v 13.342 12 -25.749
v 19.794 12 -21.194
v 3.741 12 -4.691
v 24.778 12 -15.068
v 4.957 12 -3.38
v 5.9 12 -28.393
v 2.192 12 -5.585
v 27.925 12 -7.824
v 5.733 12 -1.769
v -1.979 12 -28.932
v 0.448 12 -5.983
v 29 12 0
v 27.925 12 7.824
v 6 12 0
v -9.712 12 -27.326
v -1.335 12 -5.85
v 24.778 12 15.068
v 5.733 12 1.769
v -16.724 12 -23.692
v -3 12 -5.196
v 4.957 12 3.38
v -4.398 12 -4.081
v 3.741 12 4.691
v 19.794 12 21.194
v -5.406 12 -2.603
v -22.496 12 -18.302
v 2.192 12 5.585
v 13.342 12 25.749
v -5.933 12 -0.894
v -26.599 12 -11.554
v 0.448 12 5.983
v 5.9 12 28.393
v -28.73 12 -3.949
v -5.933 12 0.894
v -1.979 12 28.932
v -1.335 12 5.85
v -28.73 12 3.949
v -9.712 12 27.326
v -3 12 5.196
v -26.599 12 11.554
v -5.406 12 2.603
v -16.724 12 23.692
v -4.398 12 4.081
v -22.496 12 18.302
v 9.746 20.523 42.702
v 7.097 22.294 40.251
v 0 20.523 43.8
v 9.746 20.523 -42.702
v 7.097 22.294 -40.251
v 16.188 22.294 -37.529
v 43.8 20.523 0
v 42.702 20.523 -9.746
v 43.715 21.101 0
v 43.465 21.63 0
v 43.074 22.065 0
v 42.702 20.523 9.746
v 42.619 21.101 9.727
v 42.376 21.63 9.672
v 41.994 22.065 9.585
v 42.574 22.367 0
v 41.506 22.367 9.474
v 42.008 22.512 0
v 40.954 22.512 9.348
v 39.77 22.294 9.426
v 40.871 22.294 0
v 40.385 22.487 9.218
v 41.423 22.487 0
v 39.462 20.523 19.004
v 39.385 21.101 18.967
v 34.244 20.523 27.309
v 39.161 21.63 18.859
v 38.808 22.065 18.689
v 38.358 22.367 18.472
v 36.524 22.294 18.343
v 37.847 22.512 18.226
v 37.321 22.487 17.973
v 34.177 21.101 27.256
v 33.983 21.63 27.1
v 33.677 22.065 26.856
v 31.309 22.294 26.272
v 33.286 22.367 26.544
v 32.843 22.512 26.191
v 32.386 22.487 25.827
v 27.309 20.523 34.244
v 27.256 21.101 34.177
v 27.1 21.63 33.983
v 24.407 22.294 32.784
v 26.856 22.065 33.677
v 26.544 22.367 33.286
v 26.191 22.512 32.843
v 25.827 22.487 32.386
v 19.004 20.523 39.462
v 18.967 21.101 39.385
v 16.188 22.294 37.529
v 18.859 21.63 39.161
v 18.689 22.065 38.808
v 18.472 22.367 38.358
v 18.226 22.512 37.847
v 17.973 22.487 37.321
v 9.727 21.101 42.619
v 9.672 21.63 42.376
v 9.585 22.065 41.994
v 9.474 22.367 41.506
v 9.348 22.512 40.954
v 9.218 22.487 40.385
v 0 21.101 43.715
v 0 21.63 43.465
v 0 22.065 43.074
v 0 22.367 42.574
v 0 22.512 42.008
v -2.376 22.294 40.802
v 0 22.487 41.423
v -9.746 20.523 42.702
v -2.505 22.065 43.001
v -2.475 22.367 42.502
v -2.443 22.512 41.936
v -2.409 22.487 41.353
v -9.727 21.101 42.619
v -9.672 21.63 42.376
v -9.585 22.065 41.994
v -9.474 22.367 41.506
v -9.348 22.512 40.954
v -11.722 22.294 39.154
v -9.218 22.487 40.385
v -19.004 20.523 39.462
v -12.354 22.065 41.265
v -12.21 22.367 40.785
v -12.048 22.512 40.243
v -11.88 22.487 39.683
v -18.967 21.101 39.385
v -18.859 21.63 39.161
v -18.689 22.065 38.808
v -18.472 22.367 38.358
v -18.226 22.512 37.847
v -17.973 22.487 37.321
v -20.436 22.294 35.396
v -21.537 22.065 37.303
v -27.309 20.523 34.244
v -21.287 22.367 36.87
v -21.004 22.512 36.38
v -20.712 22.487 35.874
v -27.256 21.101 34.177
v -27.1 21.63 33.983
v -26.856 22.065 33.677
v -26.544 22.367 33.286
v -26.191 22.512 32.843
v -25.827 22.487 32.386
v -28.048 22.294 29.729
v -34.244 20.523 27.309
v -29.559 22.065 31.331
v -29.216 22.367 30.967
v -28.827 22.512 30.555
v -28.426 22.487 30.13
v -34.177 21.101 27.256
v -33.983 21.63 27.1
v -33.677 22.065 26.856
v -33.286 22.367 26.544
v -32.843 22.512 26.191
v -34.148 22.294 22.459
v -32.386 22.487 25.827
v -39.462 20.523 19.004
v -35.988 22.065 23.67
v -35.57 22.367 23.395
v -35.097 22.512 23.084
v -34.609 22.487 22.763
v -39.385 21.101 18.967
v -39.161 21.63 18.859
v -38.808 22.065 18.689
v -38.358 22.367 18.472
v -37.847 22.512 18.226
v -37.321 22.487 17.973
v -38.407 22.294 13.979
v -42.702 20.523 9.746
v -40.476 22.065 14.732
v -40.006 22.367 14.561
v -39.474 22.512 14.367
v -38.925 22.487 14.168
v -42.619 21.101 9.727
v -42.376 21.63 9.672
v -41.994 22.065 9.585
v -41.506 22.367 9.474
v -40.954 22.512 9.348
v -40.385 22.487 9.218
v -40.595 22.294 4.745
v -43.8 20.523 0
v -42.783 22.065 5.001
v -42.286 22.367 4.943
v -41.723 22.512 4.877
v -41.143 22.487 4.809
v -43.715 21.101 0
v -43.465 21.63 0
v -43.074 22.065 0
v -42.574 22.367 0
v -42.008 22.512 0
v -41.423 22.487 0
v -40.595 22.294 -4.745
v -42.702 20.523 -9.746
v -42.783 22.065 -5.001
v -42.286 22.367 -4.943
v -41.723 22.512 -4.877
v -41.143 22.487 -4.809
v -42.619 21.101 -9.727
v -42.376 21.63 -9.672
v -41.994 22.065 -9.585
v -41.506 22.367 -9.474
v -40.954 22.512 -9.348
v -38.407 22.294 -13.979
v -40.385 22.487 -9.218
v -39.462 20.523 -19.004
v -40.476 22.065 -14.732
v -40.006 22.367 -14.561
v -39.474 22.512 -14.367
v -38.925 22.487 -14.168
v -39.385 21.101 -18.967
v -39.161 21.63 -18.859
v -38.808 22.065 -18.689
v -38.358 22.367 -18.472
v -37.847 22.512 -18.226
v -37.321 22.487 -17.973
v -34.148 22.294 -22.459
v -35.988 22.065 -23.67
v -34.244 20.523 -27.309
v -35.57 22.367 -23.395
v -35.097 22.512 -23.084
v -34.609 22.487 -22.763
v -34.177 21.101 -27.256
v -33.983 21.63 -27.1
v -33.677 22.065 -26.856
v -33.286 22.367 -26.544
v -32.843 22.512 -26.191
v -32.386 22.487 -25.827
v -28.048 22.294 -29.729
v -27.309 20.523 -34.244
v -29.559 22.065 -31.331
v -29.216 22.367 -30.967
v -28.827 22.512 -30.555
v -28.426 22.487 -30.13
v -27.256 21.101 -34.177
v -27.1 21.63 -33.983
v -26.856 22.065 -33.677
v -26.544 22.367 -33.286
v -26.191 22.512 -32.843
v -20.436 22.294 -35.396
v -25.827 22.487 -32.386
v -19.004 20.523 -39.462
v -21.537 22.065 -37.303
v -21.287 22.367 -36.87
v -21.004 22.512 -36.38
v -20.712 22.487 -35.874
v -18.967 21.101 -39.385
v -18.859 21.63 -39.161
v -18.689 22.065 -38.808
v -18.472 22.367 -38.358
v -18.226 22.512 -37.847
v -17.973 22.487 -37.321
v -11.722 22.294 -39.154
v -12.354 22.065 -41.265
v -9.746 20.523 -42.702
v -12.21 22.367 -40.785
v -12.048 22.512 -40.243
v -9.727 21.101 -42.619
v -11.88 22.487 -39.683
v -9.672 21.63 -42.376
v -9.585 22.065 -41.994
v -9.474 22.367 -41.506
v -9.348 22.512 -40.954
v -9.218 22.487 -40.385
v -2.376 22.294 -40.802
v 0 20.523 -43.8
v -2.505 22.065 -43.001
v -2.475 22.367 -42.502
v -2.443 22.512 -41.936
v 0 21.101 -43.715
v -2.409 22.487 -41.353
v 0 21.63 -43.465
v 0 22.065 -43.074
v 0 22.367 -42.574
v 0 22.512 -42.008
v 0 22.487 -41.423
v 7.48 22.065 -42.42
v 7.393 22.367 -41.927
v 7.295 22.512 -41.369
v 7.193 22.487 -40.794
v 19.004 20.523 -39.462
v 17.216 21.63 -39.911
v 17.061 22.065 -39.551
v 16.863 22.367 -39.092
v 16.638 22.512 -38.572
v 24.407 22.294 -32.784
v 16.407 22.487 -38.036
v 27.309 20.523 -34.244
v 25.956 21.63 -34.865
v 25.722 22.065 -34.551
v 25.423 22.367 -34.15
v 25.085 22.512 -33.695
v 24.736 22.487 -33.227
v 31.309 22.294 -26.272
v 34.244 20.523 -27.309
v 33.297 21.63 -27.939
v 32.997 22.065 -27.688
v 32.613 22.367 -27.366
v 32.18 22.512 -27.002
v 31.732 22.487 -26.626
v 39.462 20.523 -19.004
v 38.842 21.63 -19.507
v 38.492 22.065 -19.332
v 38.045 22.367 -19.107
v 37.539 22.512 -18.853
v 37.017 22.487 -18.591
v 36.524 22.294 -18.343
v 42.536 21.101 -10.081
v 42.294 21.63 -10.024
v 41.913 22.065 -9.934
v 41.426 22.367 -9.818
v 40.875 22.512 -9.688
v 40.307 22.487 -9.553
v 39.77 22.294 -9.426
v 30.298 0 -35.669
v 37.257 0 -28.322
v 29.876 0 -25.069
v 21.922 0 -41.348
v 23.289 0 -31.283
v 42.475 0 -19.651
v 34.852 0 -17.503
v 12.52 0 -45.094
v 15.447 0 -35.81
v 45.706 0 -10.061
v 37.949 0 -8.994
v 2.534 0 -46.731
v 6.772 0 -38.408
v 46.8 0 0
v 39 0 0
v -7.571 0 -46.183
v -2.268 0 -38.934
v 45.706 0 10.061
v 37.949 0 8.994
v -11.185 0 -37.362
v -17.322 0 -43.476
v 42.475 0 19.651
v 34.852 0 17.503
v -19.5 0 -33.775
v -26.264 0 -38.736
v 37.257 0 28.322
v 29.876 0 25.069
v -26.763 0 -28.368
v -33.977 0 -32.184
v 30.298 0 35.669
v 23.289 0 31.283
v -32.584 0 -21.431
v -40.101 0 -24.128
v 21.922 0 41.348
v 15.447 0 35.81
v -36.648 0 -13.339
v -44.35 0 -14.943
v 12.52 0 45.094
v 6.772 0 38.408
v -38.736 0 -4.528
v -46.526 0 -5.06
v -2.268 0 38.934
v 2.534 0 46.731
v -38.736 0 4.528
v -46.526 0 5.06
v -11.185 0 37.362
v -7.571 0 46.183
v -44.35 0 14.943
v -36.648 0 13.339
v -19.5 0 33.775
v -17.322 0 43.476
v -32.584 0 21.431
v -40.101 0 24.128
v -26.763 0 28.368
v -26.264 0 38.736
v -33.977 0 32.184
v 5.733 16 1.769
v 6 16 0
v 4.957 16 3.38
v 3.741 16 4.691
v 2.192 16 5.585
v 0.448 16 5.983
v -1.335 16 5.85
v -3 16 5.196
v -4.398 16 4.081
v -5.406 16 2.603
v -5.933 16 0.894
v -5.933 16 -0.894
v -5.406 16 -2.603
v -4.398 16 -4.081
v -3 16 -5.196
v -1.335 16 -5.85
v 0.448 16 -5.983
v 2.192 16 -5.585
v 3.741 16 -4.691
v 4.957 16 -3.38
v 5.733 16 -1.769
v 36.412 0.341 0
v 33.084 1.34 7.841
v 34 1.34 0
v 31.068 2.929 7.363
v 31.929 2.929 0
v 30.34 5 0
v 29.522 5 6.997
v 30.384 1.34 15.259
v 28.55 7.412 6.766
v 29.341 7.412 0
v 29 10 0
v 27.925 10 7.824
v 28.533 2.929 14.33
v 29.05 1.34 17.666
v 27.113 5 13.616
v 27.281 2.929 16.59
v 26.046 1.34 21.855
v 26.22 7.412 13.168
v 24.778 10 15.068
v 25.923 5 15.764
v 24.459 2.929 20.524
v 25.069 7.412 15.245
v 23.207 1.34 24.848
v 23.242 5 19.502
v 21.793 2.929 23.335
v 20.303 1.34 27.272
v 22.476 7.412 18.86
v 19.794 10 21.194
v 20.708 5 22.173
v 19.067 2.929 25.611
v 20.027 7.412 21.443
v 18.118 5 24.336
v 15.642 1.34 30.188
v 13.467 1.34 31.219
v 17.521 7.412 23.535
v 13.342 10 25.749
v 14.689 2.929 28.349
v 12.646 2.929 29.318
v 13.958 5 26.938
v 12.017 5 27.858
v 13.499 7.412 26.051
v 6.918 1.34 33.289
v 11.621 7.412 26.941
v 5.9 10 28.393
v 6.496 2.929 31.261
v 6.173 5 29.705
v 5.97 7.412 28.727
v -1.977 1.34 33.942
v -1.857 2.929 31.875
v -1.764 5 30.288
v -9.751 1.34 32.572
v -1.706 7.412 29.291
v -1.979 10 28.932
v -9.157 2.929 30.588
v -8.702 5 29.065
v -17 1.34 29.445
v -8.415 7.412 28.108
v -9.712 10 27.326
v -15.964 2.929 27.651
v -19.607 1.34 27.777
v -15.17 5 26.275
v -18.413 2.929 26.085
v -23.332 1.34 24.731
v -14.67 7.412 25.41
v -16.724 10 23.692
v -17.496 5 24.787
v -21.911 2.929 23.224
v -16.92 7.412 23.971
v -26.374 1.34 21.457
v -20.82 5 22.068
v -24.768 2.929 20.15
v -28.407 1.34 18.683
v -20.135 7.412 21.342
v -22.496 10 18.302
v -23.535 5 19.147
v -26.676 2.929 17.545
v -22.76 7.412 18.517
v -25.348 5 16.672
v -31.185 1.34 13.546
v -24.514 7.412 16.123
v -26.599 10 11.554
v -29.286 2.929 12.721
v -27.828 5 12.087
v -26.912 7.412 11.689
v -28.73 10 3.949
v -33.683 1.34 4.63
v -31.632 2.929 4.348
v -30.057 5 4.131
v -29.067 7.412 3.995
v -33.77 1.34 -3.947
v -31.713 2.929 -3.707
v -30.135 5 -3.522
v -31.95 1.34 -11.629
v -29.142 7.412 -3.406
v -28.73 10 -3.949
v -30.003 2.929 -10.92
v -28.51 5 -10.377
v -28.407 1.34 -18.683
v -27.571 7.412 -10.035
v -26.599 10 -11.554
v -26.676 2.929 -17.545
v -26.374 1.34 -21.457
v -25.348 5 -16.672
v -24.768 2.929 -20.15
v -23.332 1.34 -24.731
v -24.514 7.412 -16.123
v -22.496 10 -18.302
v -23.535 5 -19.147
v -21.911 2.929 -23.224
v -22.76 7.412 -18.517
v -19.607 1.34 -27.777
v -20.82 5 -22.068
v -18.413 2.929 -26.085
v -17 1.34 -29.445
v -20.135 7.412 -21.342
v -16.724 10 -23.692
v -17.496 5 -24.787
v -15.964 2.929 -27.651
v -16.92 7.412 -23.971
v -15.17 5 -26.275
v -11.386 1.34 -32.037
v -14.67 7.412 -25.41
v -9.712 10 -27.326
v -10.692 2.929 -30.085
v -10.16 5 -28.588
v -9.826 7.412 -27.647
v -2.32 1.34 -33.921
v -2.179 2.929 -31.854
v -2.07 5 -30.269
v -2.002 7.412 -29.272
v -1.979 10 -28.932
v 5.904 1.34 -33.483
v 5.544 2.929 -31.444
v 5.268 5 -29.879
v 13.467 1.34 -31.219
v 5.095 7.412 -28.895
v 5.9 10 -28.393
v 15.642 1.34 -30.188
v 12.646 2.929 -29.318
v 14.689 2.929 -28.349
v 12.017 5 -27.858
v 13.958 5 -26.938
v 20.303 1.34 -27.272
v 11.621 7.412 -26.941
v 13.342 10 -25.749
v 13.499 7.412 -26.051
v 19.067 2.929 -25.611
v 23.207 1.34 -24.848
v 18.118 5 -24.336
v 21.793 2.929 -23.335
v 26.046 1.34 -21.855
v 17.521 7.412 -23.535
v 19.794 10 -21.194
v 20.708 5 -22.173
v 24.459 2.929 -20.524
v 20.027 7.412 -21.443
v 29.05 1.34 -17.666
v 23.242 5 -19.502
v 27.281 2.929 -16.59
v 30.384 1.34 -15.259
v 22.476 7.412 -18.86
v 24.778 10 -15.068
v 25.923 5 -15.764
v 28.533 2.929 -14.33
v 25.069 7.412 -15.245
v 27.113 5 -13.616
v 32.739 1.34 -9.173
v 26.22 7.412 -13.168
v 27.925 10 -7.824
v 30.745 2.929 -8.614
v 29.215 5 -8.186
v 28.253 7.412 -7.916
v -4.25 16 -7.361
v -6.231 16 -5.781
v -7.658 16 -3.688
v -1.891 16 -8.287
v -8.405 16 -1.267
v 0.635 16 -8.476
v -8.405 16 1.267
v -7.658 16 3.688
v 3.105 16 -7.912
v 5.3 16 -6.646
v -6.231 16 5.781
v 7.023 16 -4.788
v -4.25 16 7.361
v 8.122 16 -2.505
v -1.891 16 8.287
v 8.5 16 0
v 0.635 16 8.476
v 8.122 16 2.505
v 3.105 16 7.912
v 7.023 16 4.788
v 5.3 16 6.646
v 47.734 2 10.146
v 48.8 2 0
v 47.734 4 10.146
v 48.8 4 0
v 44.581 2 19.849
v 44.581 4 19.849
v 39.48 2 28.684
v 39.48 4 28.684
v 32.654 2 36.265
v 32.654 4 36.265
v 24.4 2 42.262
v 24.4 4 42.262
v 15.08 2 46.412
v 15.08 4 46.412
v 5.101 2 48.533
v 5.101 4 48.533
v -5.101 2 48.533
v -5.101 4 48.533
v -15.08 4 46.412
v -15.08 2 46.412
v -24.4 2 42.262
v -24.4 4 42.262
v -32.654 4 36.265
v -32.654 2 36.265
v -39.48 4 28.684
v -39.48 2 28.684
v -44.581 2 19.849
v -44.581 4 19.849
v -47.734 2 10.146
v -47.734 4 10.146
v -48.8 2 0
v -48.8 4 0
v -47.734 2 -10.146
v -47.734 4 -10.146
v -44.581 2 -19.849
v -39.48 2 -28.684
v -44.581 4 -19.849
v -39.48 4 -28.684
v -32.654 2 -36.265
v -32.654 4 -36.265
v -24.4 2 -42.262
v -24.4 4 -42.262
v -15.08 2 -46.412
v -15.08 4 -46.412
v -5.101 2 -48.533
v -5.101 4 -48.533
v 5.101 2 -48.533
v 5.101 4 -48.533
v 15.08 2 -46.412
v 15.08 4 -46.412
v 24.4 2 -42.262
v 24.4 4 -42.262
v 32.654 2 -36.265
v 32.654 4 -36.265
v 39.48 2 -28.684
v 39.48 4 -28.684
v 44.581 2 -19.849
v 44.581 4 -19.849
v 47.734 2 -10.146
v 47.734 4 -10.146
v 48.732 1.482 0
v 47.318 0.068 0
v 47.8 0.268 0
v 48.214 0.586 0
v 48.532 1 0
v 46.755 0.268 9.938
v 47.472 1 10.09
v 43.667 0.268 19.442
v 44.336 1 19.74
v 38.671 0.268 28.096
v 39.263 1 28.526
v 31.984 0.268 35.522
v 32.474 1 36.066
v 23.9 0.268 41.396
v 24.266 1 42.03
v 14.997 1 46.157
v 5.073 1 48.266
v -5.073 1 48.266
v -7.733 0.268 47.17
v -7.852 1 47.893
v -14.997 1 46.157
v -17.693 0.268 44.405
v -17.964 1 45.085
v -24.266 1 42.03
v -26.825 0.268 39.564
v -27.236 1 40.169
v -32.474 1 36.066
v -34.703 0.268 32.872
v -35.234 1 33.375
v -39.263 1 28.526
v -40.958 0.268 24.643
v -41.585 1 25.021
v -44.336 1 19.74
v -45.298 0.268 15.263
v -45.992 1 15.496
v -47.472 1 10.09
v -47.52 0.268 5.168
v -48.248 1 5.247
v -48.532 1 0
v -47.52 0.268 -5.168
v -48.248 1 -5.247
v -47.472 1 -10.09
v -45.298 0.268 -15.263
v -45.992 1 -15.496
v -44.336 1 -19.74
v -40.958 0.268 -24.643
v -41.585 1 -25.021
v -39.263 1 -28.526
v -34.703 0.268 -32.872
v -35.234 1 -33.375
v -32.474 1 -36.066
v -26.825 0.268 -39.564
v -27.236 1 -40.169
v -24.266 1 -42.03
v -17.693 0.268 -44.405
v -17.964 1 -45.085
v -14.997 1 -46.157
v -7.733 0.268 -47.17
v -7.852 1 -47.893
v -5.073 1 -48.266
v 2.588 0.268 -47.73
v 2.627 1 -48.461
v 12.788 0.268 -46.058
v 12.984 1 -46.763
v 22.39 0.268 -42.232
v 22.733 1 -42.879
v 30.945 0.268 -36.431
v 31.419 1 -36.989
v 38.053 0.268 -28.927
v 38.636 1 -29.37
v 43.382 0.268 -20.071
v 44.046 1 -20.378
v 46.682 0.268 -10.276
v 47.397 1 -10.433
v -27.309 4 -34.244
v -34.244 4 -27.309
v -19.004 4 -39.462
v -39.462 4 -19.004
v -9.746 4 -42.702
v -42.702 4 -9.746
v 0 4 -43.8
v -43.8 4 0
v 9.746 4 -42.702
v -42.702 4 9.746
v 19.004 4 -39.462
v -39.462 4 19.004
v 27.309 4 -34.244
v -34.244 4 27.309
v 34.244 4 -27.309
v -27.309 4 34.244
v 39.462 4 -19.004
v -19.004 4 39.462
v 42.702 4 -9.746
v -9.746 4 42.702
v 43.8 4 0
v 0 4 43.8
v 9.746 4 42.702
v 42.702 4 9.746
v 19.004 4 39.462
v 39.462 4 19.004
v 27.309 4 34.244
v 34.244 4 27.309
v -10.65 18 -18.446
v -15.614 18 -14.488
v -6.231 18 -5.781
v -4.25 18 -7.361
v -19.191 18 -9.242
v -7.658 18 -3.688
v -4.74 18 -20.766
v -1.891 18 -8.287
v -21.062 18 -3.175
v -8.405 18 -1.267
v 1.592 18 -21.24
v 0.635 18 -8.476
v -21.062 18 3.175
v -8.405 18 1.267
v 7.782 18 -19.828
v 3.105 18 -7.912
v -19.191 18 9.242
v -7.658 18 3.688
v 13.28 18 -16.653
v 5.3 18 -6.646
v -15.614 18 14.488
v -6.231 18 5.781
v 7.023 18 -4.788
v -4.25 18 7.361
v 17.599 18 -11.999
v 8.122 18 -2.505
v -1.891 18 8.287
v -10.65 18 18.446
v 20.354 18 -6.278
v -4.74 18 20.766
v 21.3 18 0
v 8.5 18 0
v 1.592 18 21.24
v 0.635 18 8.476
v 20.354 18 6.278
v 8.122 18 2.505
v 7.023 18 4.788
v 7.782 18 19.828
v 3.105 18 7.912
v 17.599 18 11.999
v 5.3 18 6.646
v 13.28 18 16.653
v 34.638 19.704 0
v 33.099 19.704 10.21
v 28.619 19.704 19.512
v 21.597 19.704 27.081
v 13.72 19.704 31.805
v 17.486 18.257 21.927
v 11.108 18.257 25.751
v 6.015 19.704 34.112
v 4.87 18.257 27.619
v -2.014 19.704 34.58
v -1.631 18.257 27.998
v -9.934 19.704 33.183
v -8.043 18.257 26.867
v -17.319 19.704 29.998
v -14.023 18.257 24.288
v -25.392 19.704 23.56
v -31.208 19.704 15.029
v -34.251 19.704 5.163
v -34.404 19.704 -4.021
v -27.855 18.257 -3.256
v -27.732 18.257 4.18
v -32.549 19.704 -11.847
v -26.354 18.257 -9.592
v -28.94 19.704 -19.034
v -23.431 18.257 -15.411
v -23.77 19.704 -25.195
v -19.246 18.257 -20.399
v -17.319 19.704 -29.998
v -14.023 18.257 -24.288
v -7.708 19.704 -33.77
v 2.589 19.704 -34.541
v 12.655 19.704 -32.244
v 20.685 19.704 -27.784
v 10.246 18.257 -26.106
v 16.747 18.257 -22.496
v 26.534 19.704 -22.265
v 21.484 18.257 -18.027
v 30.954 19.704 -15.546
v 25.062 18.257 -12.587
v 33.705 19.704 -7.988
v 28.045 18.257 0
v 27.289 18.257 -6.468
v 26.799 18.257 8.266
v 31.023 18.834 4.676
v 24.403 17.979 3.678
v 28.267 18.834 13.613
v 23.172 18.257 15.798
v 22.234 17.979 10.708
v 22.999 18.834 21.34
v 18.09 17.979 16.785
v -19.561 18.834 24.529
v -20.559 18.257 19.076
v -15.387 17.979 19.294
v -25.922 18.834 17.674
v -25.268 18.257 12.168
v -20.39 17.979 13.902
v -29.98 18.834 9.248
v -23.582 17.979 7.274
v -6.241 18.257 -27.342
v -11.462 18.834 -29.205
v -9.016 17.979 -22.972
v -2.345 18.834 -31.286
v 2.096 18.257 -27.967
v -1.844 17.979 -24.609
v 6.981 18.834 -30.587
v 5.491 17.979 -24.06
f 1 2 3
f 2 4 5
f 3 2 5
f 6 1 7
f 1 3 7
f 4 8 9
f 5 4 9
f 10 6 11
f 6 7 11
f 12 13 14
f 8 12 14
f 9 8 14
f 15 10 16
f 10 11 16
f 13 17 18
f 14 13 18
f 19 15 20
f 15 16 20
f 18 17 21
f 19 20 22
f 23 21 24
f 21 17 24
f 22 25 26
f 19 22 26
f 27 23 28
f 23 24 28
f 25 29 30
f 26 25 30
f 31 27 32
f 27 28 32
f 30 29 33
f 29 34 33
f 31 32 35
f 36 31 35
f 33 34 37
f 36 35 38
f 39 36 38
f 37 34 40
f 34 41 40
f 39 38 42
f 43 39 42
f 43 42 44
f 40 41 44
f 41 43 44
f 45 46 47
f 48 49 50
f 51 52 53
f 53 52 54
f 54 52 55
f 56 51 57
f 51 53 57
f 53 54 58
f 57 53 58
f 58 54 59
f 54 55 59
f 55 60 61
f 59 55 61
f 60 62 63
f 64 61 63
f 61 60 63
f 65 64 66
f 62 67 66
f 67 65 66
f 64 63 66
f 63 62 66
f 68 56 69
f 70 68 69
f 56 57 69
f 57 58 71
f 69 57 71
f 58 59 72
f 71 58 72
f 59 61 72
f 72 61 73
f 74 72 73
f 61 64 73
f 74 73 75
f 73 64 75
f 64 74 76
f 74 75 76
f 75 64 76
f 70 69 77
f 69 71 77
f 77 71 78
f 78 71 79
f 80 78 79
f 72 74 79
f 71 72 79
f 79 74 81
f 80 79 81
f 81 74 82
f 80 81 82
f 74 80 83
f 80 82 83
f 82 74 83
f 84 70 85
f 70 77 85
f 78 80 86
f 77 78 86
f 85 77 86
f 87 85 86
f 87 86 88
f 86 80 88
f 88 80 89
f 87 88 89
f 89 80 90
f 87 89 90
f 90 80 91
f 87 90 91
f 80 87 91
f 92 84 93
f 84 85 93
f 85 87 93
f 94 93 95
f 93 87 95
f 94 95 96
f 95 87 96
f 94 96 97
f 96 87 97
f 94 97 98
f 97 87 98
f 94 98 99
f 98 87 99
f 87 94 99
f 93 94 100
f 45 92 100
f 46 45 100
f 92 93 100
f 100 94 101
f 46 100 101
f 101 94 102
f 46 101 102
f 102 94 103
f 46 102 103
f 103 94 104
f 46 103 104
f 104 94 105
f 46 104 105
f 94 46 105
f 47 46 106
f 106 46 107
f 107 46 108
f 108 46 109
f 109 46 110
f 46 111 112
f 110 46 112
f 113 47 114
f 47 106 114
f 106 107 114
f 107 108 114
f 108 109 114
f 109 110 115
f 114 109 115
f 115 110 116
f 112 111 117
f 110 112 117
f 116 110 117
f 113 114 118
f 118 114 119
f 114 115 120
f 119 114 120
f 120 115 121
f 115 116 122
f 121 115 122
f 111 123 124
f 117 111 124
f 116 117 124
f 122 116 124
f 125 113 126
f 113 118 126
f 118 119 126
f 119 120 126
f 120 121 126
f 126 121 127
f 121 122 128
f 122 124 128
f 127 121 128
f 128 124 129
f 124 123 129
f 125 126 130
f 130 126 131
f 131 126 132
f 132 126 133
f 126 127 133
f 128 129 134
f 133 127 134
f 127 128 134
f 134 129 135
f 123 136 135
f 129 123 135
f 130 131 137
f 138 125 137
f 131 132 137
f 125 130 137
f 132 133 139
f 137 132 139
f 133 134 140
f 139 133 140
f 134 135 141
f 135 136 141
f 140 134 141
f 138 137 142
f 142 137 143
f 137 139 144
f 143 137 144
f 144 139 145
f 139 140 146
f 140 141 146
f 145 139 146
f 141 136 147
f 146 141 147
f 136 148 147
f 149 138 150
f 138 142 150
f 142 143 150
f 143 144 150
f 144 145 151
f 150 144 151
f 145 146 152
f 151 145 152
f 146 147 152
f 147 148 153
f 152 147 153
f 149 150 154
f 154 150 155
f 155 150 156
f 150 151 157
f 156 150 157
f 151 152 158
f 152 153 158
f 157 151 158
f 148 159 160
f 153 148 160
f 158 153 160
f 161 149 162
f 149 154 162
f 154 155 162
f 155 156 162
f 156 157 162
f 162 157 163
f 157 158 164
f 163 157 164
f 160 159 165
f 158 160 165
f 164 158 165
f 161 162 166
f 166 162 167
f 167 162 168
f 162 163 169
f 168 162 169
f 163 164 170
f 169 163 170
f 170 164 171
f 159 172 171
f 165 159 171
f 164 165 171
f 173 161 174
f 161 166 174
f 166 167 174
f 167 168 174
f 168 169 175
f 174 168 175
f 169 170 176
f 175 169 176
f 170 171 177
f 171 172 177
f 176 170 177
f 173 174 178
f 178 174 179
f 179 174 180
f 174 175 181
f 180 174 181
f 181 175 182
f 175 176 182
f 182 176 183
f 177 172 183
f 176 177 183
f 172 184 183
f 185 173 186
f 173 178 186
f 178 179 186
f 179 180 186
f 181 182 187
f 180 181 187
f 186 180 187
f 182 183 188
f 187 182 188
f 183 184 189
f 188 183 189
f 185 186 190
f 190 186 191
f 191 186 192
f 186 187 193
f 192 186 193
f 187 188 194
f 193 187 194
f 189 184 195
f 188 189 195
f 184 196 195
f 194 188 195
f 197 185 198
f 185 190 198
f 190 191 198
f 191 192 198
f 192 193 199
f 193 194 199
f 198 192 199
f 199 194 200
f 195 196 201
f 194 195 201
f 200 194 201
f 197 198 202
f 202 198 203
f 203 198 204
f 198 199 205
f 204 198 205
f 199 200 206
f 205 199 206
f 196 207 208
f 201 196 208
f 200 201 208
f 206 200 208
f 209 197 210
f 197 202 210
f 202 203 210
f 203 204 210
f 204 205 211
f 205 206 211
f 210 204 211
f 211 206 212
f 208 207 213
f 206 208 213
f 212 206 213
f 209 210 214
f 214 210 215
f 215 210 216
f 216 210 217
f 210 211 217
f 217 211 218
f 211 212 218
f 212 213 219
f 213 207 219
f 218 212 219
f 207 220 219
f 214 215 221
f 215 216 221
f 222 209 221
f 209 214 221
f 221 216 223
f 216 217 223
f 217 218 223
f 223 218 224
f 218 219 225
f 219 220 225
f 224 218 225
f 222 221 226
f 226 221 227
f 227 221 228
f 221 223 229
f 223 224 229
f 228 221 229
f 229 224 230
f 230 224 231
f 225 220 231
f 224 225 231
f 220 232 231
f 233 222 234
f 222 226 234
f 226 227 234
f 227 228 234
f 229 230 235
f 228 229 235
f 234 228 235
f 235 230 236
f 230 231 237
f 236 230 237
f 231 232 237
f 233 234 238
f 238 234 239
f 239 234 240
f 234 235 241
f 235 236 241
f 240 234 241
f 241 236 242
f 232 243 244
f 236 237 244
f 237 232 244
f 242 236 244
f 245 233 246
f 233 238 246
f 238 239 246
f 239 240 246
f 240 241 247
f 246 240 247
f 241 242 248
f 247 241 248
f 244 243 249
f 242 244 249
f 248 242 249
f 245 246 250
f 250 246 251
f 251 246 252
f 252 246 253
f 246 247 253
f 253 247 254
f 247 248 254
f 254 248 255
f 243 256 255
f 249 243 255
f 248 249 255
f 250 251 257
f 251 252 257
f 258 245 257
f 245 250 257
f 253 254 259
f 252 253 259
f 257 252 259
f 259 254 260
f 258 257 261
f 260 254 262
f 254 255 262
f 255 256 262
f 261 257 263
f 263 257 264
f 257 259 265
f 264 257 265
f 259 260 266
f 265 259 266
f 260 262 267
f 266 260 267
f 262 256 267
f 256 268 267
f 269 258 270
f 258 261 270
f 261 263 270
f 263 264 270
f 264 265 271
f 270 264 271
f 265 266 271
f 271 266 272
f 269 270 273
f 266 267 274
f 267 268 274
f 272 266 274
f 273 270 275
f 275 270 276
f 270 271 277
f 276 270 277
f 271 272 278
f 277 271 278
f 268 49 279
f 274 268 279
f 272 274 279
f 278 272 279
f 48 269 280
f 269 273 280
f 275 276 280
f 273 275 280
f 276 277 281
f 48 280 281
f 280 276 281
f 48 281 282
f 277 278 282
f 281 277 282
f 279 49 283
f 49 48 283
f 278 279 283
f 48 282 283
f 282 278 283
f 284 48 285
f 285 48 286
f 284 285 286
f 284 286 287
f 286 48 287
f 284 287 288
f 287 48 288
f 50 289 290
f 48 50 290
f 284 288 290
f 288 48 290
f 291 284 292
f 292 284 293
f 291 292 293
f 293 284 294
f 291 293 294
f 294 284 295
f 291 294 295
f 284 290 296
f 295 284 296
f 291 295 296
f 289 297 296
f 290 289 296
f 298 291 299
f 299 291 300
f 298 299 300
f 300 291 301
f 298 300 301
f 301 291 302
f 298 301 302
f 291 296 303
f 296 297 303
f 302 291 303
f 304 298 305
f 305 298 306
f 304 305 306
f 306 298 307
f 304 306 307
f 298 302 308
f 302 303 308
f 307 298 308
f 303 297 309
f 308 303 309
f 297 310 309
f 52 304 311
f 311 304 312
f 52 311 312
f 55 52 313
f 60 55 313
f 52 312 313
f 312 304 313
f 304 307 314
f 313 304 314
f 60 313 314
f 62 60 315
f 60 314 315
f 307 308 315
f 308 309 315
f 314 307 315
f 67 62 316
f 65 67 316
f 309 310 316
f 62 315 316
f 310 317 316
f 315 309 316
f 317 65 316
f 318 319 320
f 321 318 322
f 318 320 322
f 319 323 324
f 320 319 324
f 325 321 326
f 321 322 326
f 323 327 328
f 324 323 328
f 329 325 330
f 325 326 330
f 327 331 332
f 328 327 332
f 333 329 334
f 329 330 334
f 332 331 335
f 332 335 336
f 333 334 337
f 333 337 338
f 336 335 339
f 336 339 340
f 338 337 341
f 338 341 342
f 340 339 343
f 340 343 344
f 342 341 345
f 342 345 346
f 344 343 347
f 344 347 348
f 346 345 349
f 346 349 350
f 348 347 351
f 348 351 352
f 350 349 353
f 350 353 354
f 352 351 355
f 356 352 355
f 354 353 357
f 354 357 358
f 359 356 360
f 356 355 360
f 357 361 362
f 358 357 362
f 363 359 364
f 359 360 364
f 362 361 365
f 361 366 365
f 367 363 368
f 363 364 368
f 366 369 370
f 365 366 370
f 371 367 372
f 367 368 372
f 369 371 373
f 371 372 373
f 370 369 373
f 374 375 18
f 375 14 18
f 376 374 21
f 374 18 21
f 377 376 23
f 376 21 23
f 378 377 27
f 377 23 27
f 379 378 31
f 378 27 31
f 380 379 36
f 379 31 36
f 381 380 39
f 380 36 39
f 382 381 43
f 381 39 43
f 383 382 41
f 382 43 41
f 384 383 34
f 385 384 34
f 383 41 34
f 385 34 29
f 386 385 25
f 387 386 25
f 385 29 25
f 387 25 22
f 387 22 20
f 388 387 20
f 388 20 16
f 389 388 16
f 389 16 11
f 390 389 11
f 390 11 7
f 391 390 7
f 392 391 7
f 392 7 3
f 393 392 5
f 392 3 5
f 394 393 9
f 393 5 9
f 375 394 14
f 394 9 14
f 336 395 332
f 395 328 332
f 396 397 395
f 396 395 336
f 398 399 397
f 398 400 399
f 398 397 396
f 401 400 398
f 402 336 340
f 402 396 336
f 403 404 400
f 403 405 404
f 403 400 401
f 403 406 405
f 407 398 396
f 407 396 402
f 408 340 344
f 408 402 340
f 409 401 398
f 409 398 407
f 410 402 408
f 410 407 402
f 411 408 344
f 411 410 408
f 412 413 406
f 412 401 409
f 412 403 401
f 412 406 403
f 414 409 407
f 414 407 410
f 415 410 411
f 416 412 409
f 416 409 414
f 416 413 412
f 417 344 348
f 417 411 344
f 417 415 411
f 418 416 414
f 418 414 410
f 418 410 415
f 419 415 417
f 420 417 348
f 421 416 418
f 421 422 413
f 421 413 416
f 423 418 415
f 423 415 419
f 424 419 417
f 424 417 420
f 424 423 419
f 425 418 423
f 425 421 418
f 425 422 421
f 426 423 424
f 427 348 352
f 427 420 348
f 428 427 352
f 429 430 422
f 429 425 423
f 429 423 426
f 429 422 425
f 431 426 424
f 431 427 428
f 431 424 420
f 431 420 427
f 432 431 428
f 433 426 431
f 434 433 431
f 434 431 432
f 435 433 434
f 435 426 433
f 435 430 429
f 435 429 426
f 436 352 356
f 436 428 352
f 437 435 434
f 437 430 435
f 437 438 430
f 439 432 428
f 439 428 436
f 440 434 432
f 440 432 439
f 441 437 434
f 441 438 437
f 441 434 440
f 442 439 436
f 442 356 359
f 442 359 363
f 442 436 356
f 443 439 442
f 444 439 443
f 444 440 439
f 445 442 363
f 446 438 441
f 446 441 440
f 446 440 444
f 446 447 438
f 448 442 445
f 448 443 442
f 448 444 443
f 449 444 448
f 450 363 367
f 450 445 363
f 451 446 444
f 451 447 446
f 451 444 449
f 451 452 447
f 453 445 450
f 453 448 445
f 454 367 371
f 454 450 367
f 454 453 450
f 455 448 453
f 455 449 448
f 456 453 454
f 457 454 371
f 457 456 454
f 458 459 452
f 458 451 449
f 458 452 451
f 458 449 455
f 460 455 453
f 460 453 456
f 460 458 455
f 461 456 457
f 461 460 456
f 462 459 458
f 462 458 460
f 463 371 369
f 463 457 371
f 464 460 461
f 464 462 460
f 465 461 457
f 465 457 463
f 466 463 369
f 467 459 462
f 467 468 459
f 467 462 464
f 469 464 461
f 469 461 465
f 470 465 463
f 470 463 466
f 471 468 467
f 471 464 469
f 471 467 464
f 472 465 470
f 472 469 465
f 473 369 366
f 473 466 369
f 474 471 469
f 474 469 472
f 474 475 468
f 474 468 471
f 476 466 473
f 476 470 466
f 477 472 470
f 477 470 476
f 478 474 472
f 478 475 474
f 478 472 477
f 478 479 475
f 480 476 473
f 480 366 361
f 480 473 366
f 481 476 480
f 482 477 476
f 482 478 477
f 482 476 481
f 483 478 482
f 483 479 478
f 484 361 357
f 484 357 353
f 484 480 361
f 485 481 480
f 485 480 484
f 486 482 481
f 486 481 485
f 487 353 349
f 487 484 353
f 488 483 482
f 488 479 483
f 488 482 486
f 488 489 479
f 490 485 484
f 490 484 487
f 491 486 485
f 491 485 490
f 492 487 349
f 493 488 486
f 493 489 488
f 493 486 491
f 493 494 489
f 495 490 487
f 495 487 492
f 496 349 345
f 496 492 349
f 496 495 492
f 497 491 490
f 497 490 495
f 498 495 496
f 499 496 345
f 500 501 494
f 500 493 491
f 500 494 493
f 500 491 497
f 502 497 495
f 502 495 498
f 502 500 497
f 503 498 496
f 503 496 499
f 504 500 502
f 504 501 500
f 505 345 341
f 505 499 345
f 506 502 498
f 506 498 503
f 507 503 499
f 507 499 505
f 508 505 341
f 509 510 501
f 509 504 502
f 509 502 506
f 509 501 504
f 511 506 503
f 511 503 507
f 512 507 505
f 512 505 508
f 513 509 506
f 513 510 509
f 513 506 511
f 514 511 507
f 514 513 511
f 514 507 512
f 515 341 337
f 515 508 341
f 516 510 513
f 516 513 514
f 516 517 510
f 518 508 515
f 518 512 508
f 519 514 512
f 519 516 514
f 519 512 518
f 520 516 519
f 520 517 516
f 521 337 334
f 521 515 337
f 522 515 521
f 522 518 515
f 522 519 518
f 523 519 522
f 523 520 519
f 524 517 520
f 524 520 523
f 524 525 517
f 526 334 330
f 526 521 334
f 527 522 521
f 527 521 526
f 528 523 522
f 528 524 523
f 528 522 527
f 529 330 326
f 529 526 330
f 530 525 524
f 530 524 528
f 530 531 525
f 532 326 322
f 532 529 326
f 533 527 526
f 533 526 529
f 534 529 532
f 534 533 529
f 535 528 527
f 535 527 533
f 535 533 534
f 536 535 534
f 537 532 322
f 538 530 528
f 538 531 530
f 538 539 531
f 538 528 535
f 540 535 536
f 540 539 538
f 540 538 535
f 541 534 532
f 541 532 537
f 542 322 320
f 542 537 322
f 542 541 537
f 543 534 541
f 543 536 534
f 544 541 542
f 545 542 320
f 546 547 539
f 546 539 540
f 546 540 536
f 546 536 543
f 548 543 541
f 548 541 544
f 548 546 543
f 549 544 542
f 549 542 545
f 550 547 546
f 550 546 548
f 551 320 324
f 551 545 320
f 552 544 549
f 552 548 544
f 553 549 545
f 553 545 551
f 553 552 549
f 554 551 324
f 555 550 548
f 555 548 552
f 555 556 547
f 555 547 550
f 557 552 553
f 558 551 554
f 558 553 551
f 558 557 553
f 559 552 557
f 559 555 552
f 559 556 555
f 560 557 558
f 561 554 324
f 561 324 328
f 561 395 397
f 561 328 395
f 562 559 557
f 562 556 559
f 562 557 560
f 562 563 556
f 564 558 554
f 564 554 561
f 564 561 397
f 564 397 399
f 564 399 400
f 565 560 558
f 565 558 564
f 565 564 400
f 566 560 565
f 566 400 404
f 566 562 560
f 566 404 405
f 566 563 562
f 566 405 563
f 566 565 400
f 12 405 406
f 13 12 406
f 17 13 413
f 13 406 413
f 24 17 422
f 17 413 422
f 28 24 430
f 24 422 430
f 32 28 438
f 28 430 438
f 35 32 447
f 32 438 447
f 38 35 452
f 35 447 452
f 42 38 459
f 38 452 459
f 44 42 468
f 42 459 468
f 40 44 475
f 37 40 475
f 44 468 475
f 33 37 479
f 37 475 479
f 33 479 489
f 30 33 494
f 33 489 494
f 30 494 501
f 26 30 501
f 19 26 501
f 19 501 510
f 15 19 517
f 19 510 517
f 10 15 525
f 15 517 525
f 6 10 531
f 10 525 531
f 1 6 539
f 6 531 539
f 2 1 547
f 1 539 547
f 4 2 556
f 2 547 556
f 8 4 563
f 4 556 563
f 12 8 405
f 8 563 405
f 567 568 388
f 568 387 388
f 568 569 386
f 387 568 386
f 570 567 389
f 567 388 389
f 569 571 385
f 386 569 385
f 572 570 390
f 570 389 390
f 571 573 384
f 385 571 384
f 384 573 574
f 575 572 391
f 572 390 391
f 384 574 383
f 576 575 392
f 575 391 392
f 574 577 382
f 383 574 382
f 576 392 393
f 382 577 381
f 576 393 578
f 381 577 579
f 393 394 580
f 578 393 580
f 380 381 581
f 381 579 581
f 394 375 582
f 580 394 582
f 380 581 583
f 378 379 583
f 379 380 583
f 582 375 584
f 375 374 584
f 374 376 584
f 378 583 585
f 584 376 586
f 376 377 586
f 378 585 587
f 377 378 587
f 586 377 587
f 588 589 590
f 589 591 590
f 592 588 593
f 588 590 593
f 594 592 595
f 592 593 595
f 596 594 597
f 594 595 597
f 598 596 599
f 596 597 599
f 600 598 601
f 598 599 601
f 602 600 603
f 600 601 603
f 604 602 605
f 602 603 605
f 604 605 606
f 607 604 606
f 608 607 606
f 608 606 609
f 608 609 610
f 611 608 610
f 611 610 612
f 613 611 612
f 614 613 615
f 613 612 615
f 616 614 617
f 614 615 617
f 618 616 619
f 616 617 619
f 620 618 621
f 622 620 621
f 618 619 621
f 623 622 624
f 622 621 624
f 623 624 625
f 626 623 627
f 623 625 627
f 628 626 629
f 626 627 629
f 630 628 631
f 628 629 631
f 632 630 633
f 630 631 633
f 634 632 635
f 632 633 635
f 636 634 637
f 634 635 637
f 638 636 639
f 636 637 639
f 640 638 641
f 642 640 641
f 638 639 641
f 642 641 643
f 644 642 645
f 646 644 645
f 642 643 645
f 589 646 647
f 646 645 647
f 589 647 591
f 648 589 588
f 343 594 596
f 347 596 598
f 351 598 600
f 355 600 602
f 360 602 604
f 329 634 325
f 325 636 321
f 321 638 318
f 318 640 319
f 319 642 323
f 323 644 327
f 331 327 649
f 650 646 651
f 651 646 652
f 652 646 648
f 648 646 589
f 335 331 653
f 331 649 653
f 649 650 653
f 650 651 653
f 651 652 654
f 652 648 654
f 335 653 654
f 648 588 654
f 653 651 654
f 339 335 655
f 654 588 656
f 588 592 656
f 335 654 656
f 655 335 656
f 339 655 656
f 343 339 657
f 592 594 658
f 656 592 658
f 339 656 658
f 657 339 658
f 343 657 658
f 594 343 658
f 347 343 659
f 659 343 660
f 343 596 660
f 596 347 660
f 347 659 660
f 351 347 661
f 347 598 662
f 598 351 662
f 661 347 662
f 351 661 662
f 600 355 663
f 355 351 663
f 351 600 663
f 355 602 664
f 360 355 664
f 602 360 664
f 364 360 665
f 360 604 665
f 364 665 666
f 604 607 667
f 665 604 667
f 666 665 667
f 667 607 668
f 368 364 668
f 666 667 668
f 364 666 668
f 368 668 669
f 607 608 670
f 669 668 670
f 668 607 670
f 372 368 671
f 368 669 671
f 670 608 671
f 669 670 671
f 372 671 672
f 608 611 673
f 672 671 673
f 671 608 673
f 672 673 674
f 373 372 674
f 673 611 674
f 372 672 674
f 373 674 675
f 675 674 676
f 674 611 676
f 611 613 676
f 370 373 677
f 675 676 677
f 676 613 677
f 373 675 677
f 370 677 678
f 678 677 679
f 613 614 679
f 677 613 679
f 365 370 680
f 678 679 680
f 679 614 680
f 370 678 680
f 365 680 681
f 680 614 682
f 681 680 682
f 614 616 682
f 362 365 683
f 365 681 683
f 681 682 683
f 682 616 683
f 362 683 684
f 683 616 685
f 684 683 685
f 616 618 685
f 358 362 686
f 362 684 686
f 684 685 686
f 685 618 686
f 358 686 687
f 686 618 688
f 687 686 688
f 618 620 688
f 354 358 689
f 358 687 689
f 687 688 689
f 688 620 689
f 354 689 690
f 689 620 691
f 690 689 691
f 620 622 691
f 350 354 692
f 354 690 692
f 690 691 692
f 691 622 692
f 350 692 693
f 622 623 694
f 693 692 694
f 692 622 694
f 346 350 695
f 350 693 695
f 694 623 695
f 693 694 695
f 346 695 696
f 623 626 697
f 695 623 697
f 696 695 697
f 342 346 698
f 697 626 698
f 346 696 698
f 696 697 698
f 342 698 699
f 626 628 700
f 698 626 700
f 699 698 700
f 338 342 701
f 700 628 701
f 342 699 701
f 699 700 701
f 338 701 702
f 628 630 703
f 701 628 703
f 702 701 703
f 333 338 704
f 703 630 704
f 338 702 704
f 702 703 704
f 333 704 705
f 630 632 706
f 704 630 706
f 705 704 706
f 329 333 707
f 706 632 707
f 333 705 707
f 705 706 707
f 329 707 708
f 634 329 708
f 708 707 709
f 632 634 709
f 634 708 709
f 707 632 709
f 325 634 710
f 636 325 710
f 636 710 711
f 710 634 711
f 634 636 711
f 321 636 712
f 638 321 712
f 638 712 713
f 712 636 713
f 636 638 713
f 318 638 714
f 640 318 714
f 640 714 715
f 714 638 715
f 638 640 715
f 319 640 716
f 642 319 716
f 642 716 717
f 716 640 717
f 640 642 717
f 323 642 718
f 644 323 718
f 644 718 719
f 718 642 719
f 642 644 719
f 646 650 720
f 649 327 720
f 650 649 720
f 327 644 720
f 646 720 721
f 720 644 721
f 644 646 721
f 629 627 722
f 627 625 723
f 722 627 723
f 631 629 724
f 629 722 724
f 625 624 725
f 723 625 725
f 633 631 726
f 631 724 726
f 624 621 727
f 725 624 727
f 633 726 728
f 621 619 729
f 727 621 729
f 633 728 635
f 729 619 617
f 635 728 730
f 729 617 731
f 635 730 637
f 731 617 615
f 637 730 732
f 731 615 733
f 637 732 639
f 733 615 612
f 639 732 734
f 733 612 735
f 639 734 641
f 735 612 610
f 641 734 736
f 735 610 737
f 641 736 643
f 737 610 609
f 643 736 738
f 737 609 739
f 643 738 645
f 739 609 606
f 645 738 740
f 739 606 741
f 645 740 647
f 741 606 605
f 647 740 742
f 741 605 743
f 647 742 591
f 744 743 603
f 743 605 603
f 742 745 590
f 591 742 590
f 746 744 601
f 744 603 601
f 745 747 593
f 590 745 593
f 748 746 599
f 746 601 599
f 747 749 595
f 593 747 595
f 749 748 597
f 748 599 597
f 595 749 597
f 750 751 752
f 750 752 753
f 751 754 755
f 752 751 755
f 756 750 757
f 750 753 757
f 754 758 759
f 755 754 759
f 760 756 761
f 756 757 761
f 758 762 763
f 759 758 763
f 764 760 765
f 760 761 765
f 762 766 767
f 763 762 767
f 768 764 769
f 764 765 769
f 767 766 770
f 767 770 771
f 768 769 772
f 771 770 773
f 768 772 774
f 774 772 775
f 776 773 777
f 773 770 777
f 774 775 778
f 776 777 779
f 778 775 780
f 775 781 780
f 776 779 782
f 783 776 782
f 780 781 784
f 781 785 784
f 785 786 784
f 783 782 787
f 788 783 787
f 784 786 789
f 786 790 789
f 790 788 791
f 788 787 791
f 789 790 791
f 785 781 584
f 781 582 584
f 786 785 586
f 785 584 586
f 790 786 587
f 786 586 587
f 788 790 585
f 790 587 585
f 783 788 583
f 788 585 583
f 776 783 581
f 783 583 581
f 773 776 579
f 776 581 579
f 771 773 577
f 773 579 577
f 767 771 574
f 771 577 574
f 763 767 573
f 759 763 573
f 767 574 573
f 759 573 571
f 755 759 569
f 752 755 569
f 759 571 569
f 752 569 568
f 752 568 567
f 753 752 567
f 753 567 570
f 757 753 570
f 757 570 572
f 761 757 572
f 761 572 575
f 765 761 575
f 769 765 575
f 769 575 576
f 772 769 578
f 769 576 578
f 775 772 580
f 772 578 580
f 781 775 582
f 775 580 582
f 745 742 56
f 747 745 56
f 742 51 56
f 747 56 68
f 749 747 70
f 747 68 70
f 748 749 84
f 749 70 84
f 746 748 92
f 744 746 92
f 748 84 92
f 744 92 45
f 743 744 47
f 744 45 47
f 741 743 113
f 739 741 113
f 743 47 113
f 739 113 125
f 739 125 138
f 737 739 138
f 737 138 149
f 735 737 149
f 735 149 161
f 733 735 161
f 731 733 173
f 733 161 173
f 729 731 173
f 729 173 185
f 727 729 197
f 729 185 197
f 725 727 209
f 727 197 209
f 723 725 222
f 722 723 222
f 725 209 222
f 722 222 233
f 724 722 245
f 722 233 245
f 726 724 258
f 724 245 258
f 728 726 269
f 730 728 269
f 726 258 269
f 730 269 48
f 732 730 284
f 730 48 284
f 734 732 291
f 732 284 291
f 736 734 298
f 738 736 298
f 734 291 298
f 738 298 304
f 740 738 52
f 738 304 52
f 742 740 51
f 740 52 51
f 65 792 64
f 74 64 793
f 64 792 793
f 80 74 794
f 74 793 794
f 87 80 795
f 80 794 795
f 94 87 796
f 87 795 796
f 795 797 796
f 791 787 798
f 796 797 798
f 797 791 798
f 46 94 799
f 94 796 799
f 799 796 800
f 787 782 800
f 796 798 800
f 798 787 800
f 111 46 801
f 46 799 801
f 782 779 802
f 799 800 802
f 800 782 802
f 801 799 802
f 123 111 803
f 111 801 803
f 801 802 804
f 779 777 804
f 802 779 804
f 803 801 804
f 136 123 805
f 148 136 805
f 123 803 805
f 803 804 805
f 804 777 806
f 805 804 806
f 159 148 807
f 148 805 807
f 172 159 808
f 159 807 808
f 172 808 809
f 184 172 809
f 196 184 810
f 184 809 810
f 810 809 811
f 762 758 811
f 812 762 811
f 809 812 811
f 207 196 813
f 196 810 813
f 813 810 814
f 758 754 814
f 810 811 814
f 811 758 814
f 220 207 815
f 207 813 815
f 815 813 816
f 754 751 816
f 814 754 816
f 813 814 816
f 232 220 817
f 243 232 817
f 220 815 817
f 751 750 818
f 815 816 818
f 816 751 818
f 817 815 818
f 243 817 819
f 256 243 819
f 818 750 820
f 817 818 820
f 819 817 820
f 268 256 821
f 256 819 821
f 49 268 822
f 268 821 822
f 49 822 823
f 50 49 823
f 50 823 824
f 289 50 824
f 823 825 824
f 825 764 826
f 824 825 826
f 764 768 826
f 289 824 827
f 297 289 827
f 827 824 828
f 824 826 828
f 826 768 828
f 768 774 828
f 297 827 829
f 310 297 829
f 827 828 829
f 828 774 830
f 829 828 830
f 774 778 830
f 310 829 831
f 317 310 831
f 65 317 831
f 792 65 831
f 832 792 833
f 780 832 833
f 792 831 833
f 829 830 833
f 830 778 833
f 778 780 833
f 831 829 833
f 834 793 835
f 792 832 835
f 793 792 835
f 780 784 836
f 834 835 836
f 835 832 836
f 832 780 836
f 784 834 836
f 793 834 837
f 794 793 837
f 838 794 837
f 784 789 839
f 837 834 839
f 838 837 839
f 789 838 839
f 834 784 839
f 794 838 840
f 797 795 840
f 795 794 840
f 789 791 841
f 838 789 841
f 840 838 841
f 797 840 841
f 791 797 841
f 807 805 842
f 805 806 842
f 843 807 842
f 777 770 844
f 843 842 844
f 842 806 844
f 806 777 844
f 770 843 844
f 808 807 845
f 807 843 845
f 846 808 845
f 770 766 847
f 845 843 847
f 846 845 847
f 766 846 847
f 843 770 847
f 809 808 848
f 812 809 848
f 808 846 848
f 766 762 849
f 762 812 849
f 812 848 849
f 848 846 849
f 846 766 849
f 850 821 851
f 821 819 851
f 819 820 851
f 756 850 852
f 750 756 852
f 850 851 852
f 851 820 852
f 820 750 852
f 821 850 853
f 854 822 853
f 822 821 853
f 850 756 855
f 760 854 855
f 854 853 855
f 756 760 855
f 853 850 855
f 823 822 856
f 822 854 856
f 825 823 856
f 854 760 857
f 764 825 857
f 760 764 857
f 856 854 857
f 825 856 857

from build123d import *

# Parameters (mm, degrees)
FILLET1_R = 10


with BuildPart() as part:
    # Sketch1 → Revolve1 (revolve)
    with BuildSketch(Plane.XY):
        with BuildLine():
            Line((29, 0), (46.8, 0))
            ThreePointArc((46.8, 0), (48.214213562, 0.585786438), (48.8, 2))
            Line((48.8, 2), (48.8, 4))
            Line((48.8, 4), (43.8, 4))
            Line((43.8, 4), (43.8, 20.522937023))
            ThreePointArc((43.8, 20.522937023), (42.835126597, 22.234226867), (40.871487071, 22.294338655))
            ThreePointArc((40.871487071, 22.294338655), (31.373886886, 18.833953417), (21.3, 18))
            Line((21.3, 18), (8.5, 18))
            Line((8.5, 18), (8.5, 16))
            Line((8.5, 16), (6, 16))
            Line((6, 16), (6, 12))
            Line((6, 12), (29, 12))
            Line((29, 12), (29, 0))
        make_face()
    revolve(axis=Axis((0, 55, 0), (0, -1, 0)))

    # Fillet1
    fillet1_edges = [part.edges().sort_by_distance(p)[0] for p in [
        (-29, 0, 0),
    ]]
    fillet(fillet1_edges, radius=FILLET1_R)


solid = part.part
